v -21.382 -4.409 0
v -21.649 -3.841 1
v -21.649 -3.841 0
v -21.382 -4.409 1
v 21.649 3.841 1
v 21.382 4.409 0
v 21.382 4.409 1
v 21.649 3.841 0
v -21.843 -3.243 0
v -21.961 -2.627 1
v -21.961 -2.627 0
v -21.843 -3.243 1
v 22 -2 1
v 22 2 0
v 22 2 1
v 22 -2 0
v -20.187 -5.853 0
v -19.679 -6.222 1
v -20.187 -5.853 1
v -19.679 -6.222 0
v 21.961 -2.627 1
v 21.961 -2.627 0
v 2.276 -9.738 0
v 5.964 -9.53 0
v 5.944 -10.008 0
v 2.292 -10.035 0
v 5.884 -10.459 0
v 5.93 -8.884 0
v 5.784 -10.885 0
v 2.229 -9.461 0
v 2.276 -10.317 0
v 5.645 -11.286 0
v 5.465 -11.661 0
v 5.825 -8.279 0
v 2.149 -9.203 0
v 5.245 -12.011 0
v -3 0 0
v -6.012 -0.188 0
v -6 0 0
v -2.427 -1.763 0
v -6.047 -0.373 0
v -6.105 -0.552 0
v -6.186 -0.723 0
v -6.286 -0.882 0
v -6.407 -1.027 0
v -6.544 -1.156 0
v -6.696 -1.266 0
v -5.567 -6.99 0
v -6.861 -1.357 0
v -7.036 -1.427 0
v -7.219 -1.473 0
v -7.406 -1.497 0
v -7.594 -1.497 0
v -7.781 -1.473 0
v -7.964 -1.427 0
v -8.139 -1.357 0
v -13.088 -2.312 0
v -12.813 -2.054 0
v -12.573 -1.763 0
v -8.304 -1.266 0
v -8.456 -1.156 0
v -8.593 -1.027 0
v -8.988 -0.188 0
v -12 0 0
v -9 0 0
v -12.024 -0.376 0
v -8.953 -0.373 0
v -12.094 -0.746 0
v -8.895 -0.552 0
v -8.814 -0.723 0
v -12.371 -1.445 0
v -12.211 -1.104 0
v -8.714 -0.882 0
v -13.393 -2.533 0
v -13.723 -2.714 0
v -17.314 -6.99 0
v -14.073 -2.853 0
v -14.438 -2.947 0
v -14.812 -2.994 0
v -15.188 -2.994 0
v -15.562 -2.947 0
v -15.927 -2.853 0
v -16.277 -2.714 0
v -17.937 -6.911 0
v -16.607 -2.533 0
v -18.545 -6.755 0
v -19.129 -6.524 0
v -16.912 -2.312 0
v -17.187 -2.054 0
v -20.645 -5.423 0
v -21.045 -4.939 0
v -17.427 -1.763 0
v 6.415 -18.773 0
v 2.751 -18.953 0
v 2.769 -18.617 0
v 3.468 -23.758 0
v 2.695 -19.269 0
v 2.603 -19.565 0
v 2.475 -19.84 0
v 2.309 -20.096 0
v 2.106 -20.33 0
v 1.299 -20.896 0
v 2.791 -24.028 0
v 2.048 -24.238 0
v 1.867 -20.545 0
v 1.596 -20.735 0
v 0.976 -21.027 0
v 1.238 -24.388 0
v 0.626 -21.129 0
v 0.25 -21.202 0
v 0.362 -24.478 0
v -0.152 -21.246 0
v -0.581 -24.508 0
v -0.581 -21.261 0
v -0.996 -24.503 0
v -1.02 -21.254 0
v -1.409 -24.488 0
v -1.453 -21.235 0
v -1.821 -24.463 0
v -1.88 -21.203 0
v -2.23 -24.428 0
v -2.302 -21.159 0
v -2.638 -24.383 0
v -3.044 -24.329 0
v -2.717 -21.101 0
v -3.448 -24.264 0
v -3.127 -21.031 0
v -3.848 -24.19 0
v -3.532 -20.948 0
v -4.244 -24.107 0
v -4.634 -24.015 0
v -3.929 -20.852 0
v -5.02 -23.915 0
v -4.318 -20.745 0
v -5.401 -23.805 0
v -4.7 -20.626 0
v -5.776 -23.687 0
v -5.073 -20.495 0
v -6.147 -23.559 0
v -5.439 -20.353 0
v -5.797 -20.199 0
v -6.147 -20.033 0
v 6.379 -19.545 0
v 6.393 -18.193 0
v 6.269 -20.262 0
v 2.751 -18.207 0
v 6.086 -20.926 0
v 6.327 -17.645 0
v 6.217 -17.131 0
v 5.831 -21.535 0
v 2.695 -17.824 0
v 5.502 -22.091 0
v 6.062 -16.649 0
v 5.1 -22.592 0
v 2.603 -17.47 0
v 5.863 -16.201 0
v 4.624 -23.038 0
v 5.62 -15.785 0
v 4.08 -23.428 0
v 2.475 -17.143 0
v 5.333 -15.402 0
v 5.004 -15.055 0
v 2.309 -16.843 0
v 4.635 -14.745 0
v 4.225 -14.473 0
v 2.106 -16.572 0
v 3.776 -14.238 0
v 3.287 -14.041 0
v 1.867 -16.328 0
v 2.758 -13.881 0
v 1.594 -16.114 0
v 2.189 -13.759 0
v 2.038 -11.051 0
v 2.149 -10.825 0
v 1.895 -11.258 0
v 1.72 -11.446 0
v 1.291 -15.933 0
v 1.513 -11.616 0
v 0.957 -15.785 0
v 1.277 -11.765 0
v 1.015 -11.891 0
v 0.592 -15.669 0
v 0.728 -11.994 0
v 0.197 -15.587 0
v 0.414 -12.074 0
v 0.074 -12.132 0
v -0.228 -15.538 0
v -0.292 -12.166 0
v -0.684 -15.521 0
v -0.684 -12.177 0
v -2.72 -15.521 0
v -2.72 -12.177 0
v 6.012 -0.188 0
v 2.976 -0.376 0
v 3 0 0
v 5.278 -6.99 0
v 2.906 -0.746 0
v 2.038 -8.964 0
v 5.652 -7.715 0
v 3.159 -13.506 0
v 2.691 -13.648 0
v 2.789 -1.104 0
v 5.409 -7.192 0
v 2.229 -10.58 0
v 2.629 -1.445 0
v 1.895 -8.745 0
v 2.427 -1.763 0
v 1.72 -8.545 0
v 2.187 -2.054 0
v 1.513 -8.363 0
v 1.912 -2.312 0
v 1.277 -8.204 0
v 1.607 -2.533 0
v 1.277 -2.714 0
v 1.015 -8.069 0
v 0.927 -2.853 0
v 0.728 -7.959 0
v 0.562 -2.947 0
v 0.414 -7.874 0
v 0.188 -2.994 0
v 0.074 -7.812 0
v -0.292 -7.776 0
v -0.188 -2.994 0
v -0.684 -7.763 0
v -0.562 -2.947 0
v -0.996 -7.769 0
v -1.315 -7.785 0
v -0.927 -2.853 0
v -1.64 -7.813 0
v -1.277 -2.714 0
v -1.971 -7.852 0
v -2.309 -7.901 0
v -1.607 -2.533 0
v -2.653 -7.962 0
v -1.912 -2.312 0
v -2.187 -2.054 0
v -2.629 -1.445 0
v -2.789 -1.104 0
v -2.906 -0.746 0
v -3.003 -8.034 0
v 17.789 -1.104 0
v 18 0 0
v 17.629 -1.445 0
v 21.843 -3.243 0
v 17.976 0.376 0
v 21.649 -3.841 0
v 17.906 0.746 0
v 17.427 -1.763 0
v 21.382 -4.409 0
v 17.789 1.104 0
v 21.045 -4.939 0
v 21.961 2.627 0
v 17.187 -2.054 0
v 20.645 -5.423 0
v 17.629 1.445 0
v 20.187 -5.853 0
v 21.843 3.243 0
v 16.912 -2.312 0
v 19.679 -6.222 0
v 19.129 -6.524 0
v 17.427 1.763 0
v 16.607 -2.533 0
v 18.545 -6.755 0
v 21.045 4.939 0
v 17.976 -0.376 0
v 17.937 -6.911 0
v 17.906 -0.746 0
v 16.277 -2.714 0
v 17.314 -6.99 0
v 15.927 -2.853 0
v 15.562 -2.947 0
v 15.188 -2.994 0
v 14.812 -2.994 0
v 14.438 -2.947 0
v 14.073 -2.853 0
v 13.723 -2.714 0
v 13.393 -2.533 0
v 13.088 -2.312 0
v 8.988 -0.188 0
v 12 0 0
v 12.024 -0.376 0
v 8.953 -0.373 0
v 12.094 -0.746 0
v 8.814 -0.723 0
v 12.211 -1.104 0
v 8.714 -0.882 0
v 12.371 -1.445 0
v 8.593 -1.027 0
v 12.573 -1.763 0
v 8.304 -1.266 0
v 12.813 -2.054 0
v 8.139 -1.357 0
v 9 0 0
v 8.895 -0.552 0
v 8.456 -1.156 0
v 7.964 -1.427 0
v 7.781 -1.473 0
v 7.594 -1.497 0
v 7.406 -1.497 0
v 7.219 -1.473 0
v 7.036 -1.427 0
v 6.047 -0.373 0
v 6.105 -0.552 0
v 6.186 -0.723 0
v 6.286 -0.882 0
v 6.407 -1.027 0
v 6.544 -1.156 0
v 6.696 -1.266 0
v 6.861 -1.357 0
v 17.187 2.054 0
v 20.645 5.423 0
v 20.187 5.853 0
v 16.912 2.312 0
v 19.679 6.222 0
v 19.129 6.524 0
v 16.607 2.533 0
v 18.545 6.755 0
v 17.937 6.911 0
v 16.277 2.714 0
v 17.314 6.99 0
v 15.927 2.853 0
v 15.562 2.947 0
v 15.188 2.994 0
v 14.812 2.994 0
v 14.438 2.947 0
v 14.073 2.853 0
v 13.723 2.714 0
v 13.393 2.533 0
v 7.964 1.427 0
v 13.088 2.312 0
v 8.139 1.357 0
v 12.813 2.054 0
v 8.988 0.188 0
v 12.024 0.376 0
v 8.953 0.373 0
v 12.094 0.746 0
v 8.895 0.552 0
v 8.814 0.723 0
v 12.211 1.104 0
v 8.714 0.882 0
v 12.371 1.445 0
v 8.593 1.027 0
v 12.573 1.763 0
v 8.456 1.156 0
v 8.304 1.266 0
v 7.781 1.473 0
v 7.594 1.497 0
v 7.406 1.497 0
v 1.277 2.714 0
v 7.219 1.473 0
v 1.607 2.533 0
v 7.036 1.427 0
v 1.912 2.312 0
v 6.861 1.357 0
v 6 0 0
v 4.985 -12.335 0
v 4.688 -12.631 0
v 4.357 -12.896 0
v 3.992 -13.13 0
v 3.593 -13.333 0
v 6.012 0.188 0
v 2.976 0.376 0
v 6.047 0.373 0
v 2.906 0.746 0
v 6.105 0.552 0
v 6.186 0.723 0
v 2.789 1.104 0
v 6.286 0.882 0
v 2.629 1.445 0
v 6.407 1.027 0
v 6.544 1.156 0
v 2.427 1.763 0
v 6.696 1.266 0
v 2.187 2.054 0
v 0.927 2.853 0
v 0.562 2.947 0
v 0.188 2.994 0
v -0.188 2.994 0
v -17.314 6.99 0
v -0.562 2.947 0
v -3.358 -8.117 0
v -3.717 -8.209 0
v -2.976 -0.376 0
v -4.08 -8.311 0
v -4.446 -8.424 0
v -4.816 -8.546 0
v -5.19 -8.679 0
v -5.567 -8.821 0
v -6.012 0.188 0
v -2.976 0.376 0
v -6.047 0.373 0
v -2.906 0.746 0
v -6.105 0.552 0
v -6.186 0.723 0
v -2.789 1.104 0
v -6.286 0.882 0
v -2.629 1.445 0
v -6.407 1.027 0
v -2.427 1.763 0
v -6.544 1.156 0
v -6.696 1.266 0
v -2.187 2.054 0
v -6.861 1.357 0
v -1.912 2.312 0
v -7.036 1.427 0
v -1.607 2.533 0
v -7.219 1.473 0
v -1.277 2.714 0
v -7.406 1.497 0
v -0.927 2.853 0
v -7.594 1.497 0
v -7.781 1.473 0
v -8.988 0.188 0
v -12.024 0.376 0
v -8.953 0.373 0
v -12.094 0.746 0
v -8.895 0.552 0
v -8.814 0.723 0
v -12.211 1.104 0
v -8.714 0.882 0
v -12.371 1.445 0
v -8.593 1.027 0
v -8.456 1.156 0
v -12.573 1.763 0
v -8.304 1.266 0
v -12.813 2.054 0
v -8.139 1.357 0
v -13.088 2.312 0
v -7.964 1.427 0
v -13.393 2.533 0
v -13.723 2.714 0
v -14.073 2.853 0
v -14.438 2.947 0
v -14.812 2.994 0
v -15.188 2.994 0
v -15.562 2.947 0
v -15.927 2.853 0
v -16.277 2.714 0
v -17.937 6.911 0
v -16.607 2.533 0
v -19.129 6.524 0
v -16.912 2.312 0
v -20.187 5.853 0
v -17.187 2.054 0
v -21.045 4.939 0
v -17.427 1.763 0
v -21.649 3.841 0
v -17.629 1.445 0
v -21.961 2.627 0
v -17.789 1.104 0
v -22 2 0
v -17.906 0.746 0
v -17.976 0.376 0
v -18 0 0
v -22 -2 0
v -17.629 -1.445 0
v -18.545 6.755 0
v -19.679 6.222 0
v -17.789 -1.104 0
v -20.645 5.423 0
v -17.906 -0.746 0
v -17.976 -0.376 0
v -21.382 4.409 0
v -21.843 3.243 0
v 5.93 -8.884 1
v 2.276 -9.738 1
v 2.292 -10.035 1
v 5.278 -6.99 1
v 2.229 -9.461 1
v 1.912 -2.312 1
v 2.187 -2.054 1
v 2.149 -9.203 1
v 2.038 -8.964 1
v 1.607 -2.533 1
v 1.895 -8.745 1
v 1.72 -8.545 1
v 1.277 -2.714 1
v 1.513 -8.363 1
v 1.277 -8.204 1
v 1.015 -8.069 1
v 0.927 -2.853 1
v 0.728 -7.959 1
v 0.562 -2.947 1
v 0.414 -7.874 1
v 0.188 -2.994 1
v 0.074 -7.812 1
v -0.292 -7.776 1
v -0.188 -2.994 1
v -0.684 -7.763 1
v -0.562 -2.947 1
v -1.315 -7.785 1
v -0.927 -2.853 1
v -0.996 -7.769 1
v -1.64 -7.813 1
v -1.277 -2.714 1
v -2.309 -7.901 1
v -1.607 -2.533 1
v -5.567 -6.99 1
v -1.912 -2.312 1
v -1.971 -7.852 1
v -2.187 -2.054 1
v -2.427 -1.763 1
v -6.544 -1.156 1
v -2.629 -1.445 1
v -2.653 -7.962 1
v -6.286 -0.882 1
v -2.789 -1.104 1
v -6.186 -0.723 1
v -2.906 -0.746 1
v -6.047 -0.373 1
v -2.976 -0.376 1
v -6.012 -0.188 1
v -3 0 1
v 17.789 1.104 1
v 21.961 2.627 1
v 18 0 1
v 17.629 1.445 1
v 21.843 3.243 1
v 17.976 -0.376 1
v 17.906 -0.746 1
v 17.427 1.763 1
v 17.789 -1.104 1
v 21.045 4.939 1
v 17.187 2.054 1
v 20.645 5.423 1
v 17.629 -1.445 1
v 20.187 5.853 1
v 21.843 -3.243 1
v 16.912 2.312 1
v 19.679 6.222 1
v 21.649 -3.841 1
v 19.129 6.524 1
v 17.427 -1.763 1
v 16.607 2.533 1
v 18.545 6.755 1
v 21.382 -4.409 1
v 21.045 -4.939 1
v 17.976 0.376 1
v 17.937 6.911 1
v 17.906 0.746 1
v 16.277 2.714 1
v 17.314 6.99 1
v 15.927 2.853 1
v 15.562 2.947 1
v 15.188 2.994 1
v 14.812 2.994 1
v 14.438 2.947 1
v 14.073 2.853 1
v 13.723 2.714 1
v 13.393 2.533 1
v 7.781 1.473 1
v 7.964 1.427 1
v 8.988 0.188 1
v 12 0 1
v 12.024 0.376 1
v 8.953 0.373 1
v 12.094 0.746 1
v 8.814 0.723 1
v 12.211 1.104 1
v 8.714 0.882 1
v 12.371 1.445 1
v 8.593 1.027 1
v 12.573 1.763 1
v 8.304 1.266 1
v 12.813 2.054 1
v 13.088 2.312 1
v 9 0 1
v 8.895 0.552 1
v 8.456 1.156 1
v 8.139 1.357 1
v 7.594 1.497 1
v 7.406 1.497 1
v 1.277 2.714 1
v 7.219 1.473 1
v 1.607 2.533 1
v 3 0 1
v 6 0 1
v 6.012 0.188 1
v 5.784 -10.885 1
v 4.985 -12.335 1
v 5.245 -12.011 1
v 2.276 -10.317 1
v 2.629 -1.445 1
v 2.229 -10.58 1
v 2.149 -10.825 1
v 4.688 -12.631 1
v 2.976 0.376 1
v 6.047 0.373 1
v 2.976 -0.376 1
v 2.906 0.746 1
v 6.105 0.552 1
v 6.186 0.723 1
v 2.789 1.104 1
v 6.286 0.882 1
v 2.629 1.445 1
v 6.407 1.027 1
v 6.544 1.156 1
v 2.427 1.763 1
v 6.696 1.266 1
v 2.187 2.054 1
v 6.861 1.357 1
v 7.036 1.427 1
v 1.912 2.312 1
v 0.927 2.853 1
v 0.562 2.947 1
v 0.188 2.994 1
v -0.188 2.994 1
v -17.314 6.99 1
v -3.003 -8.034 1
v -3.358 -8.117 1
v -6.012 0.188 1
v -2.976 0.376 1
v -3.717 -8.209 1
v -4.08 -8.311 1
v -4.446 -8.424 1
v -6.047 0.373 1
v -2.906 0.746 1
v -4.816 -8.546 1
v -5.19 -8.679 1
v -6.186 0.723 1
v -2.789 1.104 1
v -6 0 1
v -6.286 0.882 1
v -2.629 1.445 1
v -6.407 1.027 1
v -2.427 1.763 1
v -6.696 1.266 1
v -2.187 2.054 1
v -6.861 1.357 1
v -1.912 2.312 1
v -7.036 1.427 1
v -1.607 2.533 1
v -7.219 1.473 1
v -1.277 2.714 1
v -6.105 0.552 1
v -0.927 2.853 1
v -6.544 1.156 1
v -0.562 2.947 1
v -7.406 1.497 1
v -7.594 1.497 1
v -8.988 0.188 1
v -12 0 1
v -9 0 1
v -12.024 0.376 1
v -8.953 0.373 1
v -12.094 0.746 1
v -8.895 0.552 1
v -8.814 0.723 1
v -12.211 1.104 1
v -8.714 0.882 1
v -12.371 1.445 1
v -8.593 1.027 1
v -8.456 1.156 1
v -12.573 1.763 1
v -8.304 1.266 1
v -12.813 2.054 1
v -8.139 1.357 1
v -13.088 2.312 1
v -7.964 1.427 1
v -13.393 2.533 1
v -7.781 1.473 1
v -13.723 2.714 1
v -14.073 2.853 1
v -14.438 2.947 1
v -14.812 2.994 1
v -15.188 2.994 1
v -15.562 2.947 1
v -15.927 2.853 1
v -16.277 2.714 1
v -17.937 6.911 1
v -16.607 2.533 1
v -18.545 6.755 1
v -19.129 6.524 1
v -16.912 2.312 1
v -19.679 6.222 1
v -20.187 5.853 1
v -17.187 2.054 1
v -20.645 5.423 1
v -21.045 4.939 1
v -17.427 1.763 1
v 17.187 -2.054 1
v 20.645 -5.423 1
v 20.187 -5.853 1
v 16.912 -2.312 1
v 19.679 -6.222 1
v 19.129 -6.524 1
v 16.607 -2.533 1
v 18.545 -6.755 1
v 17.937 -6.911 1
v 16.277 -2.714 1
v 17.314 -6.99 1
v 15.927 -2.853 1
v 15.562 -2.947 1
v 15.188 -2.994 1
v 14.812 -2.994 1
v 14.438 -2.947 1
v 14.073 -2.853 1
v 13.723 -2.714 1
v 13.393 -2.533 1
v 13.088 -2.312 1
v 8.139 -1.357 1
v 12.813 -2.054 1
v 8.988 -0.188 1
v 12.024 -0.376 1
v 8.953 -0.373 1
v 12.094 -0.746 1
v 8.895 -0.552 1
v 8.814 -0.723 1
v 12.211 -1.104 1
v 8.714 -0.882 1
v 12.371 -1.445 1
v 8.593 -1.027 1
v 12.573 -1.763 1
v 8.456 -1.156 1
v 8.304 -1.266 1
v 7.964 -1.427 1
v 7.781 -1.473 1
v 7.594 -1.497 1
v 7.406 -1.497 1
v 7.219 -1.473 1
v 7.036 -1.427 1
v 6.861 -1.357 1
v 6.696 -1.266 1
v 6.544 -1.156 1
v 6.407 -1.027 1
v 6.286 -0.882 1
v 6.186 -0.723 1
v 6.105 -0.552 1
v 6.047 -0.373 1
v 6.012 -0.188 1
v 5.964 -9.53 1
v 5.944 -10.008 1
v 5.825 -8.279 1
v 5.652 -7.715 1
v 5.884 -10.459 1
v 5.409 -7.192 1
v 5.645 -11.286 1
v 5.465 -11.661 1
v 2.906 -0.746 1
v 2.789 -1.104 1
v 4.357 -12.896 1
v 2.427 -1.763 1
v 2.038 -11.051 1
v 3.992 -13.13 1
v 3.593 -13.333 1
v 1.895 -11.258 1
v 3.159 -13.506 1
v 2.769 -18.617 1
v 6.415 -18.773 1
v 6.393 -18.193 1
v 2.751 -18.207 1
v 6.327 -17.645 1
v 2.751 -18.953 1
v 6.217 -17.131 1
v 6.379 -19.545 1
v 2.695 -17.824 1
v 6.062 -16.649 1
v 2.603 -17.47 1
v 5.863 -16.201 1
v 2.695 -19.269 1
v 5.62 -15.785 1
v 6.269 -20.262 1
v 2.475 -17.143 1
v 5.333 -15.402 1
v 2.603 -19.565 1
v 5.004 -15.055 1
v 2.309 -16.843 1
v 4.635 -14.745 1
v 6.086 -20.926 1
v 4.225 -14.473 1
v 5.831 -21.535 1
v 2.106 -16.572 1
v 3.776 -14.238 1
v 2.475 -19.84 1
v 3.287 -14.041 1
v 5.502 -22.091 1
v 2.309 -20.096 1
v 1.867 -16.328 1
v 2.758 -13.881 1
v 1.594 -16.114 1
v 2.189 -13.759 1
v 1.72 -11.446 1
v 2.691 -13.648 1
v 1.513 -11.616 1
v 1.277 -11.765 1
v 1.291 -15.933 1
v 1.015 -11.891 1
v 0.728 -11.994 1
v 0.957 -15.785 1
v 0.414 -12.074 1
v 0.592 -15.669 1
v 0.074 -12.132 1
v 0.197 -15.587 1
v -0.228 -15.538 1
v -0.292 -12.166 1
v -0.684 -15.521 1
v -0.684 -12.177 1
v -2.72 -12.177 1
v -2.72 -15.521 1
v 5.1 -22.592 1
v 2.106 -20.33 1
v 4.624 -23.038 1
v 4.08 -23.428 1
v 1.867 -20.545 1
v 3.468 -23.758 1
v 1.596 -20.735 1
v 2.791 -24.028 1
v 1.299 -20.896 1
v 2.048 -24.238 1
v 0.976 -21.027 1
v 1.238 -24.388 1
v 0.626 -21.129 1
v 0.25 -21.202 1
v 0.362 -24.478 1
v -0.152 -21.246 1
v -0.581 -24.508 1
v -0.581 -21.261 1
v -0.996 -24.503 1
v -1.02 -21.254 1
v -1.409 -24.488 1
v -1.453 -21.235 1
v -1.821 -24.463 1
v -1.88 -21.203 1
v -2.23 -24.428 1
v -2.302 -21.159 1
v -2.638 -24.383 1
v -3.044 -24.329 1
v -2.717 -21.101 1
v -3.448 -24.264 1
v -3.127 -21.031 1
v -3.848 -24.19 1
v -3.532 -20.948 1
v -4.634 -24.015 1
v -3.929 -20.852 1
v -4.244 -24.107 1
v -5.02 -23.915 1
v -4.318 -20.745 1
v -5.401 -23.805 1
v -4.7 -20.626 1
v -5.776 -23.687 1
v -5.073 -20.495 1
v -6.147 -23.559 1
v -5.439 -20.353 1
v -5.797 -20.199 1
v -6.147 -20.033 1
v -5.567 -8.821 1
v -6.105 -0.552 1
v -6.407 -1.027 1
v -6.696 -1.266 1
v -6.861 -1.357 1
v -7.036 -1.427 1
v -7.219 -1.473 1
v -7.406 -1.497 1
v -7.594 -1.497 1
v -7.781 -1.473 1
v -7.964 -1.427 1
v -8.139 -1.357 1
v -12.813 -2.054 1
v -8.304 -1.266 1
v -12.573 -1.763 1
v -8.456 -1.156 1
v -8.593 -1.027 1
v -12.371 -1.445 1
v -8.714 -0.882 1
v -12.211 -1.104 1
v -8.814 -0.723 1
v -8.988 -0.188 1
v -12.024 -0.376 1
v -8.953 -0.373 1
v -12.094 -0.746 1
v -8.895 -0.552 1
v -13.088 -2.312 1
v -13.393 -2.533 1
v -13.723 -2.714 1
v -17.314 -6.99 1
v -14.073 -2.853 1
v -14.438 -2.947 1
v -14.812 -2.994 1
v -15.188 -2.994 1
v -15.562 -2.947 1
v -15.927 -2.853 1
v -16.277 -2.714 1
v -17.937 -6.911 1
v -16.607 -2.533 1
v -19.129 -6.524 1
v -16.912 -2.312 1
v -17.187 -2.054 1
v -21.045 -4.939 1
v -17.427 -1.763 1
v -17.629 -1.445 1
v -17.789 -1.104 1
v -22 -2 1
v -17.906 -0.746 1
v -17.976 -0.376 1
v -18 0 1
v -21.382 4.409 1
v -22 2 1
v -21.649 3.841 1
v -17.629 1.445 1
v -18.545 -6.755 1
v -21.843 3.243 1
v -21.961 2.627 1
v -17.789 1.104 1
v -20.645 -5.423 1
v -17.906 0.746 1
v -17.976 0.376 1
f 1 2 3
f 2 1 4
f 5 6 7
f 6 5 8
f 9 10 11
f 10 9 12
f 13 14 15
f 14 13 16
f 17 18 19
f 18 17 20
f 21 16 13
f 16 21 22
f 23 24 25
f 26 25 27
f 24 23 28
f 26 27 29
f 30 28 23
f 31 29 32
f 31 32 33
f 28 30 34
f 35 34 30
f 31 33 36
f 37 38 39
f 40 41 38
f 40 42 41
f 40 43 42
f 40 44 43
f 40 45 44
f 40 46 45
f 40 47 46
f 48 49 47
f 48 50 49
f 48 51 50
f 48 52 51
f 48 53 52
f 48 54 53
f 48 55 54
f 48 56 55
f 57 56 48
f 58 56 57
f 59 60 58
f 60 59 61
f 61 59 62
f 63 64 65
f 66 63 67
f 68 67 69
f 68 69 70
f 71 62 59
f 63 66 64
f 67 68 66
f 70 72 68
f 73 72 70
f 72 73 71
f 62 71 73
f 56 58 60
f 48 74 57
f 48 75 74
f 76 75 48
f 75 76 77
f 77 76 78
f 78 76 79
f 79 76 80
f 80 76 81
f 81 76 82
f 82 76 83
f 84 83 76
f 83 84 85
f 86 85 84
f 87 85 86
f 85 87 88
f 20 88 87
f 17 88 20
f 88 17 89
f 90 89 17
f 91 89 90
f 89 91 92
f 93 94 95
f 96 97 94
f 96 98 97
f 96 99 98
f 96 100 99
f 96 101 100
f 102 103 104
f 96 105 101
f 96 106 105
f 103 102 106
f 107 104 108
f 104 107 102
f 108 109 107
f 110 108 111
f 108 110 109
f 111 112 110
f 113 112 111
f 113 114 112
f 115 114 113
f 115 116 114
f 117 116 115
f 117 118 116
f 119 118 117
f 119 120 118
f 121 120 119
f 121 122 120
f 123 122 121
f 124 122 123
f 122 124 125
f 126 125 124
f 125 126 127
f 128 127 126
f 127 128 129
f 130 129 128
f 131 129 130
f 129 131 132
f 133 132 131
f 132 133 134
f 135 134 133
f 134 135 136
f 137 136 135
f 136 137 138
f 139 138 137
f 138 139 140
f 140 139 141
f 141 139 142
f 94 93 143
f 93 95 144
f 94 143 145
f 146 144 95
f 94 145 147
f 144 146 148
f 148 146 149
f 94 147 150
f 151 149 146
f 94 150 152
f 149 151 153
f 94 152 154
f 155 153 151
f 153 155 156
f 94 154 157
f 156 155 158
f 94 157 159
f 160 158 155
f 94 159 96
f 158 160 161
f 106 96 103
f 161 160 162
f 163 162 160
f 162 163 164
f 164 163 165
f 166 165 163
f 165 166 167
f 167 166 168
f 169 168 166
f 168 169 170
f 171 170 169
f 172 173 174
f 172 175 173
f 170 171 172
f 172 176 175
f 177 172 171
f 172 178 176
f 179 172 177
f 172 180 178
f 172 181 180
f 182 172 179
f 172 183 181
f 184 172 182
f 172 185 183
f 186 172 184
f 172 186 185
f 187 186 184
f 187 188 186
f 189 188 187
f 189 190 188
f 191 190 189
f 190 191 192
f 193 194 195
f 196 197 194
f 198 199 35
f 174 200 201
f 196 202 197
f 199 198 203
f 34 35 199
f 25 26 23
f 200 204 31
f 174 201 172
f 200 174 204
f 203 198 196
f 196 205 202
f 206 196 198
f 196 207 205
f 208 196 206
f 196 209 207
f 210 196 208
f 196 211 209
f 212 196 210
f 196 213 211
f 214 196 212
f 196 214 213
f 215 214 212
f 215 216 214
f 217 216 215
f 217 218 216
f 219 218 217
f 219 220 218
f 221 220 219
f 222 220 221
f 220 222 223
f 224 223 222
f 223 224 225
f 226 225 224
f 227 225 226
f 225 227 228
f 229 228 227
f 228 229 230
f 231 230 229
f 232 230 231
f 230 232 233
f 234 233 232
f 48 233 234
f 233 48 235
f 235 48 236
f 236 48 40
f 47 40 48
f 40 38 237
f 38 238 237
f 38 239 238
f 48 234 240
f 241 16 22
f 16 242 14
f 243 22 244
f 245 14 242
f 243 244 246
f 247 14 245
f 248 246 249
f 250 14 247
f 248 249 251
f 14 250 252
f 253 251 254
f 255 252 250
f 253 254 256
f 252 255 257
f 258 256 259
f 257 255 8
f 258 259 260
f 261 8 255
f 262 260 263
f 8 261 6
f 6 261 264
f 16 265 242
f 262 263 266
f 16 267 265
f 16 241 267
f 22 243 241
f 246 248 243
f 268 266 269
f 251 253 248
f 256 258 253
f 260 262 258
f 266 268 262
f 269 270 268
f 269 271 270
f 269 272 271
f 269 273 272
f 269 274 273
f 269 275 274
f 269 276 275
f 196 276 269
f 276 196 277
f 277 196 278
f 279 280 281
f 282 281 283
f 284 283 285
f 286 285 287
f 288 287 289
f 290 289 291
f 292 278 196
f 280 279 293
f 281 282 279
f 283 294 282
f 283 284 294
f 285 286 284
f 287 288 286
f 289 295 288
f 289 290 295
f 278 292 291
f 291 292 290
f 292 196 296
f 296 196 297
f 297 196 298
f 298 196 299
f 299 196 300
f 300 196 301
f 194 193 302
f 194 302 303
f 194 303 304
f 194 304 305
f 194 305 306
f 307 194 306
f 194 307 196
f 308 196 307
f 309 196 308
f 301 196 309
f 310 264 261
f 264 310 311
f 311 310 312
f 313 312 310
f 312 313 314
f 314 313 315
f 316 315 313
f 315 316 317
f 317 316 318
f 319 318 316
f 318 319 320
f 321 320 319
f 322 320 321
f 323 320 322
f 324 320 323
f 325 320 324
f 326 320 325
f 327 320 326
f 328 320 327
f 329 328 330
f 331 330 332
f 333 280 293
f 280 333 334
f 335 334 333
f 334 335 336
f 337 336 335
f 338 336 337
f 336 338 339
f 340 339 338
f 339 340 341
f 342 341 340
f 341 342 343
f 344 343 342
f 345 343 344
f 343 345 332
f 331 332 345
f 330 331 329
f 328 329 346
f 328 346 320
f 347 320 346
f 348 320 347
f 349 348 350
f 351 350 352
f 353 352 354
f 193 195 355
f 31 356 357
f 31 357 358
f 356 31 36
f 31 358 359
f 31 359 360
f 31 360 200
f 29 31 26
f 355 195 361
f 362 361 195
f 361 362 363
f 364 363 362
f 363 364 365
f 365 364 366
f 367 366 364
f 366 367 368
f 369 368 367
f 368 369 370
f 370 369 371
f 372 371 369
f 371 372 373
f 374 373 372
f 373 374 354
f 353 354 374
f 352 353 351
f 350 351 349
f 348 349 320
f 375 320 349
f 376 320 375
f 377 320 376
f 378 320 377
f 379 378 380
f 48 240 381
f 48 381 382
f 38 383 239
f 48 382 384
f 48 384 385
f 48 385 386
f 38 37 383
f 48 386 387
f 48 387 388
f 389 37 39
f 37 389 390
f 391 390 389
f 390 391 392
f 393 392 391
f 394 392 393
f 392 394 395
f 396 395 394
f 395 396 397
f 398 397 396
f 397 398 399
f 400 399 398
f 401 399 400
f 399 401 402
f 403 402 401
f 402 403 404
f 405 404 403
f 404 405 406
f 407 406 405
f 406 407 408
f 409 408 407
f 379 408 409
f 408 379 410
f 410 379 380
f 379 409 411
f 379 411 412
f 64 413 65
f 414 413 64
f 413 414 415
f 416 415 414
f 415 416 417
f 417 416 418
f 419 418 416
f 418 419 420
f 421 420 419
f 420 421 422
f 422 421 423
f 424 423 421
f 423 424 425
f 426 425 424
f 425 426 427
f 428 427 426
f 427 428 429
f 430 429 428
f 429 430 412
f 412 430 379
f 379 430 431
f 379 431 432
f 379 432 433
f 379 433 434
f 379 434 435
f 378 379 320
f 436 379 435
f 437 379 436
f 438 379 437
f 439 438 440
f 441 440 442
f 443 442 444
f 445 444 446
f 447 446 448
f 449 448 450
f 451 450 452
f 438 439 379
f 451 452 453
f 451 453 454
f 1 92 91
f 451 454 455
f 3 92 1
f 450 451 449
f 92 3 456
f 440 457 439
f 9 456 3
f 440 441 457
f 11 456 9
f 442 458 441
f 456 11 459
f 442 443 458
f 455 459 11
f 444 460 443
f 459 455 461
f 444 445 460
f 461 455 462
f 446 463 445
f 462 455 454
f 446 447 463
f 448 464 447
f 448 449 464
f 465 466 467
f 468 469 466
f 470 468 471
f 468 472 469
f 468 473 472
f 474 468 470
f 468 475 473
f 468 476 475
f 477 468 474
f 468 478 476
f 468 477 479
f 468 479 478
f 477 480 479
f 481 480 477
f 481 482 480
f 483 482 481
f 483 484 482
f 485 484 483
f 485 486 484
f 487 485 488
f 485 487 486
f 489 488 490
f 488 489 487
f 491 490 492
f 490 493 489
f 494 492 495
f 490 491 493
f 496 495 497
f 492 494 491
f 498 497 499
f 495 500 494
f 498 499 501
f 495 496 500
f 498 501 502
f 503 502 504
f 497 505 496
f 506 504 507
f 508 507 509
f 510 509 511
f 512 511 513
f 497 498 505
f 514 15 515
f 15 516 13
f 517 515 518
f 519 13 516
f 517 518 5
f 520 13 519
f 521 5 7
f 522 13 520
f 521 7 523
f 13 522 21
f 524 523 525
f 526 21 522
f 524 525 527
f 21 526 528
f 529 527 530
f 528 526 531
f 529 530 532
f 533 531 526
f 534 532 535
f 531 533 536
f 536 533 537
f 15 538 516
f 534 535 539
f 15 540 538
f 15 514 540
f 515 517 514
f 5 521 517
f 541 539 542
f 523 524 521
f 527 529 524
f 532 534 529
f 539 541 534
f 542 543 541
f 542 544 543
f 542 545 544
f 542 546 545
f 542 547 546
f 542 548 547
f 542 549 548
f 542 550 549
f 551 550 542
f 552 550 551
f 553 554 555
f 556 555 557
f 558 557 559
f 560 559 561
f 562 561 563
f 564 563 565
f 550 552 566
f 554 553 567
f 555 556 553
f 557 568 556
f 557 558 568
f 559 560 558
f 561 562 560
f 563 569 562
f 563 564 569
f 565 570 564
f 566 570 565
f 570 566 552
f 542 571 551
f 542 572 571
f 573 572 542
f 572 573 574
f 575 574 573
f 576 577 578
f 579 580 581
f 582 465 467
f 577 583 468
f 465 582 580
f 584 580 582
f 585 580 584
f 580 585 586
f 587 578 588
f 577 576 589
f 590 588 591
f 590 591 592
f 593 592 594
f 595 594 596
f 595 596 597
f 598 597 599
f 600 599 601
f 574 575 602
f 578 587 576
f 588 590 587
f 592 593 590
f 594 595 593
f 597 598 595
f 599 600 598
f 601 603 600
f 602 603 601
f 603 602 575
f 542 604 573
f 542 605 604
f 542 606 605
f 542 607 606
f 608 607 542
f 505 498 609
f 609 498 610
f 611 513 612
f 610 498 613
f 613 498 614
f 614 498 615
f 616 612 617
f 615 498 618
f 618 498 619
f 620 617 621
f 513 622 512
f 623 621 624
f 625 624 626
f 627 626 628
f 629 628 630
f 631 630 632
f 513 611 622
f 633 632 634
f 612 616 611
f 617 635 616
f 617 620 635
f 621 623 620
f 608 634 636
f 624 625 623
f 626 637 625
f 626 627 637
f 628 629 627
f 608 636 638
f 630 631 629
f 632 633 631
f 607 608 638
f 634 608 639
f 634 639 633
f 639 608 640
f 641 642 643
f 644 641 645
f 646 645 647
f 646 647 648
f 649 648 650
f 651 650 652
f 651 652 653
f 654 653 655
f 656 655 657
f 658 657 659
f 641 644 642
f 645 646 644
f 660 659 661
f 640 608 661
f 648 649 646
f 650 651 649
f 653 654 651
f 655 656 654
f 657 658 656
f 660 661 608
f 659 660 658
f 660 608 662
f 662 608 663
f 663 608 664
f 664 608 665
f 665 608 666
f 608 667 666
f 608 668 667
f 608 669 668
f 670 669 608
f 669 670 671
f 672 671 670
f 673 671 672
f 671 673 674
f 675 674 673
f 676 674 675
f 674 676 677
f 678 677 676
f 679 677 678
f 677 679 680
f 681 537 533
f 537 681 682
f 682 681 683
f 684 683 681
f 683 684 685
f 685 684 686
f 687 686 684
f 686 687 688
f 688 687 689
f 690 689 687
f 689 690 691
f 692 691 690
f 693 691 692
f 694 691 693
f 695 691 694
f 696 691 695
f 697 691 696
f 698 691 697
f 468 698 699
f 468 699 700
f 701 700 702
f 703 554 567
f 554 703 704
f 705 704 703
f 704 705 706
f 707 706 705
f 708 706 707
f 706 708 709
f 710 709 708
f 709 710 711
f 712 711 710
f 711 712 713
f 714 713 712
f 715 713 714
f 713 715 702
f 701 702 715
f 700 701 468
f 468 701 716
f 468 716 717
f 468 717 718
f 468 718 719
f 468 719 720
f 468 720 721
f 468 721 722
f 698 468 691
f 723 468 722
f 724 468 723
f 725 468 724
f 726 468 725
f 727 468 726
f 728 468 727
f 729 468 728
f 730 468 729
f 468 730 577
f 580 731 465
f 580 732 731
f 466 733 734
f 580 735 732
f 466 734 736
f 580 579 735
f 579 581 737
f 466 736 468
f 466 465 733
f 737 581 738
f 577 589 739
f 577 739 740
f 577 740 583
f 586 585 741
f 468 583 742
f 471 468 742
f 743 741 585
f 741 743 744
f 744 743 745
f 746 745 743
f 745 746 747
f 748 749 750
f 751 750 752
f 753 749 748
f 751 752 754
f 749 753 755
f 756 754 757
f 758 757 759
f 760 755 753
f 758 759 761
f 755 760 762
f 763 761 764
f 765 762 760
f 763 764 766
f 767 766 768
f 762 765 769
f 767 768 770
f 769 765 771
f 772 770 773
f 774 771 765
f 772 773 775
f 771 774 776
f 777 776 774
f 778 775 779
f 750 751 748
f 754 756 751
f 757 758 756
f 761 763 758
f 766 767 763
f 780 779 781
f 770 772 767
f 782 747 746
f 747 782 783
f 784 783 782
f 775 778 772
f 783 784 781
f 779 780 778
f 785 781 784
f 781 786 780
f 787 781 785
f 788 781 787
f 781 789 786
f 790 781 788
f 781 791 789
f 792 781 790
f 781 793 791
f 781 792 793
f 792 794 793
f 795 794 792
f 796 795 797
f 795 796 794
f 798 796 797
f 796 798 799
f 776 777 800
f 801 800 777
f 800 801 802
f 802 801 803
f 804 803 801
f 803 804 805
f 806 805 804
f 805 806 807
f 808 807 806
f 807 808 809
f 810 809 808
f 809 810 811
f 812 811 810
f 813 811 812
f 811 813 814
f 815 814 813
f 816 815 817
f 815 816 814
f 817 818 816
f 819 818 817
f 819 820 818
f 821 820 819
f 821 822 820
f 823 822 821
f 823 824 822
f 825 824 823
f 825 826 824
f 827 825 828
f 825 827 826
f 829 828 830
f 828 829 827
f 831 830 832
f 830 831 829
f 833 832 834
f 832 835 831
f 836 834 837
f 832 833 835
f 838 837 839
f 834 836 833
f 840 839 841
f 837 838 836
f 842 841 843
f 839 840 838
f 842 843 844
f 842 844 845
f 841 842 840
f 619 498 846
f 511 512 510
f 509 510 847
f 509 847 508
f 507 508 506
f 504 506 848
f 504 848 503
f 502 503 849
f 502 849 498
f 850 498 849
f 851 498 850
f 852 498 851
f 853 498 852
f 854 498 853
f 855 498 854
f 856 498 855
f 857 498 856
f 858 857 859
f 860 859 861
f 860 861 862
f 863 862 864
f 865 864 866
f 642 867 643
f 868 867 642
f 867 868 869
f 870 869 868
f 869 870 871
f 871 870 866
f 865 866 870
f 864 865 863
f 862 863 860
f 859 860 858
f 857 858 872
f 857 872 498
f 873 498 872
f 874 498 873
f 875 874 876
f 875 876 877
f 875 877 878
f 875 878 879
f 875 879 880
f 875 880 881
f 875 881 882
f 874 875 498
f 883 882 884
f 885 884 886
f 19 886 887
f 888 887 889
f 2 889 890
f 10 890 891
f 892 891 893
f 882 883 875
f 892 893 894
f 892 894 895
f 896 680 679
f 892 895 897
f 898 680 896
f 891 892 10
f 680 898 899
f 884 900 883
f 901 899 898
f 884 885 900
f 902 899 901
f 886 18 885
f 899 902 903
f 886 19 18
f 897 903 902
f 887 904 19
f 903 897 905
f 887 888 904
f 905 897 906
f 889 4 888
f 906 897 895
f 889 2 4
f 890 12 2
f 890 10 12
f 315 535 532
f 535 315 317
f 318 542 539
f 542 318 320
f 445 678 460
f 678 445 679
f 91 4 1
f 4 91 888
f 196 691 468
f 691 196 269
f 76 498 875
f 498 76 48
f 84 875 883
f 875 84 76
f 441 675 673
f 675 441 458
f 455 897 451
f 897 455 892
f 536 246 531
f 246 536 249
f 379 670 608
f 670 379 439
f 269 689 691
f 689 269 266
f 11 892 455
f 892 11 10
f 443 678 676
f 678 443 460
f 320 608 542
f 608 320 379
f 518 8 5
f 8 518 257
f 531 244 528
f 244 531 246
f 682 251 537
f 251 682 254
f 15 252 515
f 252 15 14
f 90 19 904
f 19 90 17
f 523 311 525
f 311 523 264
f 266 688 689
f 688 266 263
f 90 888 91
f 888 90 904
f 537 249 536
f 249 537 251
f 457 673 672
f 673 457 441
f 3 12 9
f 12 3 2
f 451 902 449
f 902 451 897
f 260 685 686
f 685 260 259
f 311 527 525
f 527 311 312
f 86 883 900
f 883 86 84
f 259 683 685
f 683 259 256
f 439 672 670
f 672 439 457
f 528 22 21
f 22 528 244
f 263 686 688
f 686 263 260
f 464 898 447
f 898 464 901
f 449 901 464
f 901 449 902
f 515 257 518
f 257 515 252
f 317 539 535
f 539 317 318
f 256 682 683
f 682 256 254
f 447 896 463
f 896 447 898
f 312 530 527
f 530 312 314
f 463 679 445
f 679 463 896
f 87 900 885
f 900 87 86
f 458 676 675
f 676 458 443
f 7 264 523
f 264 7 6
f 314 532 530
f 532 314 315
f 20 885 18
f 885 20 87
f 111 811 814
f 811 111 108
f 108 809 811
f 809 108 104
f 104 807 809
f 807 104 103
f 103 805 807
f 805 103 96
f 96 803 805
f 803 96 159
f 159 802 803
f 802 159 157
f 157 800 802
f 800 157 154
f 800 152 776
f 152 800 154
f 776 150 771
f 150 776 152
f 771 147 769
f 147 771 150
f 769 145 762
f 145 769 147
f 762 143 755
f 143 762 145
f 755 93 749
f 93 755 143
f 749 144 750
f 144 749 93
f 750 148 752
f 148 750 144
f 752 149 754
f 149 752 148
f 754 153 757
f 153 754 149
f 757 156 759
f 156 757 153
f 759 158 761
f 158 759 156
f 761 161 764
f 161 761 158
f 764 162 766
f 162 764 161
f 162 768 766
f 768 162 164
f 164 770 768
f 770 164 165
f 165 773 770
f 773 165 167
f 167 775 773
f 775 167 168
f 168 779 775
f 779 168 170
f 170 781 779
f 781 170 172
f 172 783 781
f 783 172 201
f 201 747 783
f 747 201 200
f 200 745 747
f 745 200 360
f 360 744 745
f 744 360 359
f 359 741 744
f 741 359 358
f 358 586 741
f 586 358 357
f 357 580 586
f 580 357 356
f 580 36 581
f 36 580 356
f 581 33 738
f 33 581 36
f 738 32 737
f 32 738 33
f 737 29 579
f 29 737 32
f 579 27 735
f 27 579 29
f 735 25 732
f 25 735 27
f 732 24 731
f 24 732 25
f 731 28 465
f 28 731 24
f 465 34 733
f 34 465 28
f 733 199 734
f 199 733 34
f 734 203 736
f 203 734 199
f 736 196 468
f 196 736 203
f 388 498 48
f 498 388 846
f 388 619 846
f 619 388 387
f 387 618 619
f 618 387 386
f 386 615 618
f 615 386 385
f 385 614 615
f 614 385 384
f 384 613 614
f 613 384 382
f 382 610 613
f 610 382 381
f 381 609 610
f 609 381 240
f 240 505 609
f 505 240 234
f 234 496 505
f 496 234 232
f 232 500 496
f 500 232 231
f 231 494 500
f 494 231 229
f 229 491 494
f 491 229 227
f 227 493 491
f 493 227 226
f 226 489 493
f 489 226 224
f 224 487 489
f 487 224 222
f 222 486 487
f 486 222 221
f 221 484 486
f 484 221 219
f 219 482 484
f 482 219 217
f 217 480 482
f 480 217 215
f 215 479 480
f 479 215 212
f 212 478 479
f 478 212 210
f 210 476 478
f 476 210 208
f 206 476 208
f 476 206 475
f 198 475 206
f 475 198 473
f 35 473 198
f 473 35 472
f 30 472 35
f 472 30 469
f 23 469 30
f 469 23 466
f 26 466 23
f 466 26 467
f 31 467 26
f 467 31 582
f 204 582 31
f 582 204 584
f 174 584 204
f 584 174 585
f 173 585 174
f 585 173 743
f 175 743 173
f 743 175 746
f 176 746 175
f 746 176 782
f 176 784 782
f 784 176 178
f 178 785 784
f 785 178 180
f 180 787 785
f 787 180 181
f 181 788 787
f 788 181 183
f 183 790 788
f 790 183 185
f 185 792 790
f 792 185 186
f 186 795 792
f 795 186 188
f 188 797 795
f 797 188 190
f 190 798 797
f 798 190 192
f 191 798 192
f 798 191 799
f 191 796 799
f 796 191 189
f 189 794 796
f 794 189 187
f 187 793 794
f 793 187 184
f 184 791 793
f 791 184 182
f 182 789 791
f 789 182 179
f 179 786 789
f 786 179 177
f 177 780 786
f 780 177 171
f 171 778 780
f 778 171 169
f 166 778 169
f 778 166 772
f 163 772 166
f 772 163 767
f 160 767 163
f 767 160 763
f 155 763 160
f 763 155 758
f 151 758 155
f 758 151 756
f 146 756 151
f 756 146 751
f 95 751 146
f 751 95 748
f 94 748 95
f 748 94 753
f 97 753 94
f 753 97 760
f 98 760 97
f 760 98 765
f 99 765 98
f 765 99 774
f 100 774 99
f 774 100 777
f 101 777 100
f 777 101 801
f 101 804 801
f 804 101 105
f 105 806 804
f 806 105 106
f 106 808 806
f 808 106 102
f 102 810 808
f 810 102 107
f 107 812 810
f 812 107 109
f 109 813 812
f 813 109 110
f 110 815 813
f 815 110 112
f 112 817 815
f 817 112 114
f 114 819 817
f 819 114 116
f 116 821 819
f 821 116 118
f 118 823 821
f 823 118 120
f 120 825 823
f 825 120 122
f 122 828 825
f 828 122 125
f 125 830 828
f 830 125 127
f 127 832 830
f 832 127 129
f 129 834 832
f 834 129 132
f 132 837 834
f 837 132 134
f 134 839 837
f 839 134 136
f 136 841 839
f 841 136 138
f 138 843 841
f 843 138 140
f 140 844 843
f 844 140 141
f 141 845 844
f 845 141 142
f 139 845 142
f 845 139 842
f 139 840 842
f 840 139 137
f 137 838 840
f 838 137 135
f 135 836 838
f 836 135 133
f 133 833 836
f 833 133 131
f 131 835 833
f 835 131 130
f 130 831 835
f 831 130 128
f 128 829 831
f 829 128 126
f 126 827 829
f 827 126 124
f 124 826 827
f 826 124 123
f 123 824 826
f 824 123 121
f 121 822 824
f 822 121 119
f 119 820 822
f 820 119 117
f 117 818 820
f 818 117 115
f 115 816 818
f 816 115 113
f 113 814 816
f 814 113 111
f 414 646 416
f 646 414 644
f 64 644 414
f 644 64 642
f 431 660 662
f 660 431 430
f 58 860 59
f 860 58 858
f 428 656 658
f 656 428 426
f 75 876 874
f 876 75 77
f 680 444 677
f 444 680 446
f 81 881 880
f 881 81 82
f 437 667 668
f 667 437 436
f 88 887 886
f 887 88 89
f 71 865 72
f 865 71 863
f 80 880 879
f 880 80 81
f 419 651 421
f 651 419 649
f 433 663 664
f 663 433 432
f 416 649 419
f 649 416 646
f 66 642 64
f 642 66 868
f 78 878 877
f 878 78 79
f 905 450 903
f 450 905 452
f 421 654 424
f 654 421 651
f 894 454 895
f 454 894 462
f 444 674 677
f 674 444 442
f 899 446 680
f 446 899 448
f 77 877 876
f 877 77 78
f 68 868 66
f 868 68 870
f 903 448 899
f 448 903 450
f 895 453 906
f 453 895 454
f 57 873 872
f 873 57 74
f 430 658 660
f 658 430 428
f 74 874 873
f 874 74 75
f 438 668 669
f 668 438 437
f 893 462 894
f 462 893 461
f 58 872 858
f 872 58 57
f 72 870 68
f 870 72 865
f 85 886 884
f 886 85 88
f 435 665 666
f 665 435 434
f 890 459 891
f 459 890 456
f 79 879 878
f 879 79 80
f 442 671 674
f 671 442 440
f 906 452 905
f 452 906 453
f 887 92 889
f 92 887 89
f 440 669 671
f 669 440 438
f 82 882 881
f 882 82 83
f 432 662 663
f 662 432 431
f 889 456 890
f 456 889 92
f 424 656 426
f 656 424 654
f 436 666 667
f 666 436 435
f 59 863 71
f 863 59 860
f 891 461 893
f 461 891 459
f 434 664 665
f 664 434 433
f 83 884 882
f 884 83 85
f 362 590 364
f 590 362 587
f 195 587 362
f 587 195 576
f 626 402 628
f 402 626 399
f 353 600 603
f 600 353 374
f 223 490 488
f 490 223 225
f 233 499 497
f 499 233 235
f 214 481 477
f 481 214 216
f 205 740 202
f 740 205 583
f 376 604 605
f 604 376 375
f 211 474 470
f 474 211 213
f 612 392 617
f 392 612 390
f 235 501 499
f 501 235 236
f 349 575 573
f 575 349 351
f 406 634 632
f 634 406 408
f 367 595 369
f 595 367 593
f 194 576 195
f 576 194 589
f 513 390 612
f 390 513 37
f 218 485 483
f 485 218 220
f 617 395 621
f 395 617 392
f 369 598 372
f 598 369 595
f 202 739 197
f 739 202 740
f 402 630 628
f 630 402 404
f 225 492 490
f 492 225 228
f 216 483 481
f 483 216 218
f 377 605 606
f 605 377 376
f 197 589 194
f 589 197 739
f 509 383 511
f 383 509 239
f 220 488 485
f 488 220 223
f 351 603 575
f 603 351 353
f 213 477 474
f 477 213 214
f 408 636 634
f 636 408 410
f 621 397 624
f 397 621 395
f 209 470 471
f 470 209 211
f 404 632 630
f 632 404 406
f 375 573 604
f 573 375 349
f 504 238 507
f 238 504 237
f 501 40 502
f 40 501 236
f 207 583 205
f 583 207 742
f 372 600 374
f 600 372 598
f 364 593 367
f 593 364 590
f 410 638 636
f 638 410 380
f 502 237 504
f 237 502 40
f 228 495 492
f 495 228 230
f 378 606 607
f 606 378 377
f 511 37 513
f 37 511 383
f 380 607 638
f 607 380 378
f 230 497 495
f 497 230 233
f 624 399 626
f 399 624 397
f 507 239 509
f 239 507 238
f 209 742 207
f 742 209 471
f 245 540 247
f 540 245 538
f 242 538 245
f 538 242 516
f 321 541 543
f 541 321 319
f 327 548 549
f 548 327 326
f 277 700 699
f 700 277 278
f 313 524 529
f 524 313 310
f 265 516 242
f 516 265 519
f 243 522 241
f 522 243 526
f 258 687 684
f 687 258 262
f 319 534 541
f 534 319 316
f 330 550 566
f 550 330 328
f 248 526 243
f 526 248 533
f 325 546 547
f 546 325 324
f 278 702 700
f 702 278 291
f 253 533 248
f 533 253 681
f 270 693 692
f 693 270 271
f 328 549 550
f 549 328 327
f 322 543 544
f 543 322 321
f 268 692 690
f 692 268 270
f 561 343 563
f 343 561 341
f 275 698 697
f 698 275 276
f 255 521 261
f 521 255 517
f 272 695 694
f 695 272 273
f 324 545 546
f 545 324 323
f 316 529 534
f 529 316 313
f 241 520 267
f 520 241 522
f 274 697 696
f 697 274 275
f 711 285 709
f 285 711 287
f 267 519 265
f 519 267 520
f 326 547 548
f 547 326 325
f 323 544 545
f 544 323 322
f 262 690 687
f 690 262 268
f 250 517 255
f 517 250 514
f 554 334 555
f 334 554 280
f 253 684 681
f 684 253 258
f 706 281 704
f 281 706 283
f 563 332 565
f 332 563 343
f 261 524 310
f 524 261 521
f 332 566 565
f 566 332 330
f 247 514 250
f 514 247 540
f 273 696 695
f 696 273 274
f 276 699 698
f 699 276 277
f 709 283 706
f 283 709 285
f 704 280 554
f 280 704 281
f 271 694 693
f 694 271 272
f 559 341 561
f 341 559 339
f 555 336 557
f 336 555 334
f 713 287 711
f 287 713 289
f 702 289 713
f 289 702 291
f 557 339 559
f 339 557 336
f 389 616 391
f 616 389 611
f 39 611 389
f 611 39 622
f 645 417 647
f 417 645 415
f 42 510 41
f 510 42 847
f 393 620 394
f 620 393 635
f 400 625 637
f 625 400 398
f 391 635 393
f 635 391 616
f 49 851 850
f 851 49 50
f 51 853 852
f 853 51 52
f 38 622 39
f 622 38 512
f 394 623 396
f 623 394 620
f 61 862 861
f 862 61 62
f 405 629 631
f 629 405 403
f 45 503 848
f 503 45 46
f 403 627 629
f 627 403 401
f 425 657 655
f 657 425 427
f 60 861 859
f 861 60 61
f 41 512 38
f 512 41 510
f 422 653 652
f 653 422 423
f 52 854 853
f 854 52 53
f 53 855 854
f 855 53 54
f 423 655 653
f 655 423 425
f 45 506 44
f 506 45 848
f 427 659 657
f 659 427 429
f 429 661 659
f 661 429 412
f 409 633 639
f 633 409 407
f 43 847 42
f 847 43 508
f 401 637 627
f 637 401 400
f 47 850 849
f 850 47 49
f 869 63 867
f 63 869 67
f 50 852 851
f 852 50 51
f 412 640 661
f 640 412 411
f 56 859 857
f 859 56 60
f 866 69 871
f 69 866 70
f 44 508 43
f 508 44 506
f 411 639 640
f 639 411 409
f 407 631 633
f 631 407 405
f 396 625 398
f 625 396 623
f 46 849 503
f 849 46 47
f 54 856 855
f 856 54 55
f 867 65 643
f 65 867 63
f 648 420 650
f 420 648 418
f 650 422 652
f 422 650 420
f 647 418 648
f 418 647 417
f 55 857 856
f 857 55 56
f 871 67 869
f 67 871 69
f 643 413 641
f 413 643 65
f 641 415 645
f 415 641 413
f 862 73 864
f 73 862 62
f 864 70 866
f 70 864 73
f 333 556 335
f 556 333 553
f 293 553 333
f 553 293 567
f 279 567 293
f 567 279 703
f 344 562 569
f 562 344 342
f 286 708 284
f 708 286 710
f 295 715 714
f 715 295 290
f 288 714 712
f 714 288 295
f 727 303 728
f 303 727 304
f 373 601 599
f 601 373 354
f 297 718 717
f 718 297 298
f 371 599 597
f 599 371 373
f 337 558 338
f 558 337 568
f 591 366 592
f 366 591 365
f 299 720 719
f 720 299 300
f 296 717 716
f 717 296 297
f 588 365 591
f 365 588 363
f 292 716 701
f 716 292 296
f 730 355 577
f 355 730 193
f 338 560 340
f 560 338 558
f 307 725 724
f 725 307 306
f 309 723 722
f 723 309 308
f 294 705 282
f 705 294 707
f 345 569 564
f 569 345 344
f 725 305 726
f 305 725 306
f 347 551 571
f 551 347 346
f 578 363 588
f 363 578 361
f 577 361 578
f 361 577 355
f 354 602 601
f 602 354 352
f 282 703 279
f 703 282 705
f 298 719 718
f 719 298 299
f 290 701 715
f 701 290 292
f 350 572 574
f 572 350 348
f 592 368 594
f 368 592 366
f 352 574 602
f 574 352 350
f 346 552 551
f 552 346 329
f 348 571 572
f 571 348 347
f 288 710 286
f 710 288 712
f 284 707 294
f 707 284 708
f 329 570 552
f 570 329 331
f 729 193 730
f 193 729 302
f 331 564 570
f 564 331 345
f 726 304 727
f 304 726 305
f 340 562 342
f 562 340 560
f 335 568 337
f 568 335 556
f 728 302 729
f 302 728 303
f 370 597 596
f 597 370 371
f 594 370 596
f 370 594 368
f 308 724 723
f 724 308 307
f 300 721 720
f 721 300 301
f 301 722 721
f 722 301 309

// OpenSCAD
$fn = 50;


difference() {
	union() {
		*color(alpha = 1.0000000000, c = "gray") {
			translate(v = [0, 14, 0]) {
				linear_extrude(height = 1) {
					text(font = "Arial:style=Bold", halign = "center", size = 4.5000000000, text = "COMMENT description oobb_plate_shape_p_type_1_depth_3_width_1_thickness_3_extra_oobb_size", valign = "center");
				}
			}
		}
		hull() {
			translate(v = [-17.0000000000, 2.0000000000, 0]) {
				cylinder(h = 1, r = 5);
			}
			translate(v = [17.0000000000, 2.0000000000, 0]) {
				cylinder(h = 1, r = 5);
			}
			translate(v = [-17.0000000000, -2.0000000000, 0]) {
				cylinder(h = 1, r = 5);
			}
			translate(v = [17.0000000000, -2.0000000000, 0]) {
				cylinder(h = 1, r = 5);
			}
		}
		translate(v = [0, -5, 0]) {
			linear_extrude(height = 1) {
				text(font = "DejaVu Sans Mono:style=Bold", halign = "center", size = 19.0000000000, text = "3", valign = "top");
			}
		}
	}
	union() {
		*color(alpha = 1.0000000000, c = "gray") {
			translate(v = [0, 14, 0]) {
				linear_extrude(height = 1) {
					text(font = "Arial:style=Bold", halign = "center", size = 4.5000000000, text = "COMMENT description oobb_holes_shape_n_type_3_width_1_thickness_3_extra_oobb_size_1_height_'all'_holes_true_both_holes", valign = "center");
				}
			}
		}
		translate(v = [-15.0000000000, 0.0000000000, 0]) {
			translate(v = [0, 0, -50]) {
				cylinder(h = 100, r = 3.0000000000);
			}
		}
		translate(v = [0, 0, -50]) {
			cylinder(h = 100, r = 3.0000000000);
		}
		translate(v = [15.0000000000, 0.0000000000, 0]) {
			translate(v = [0, 0, -50]) {
				cylinder(h = 100, r = 3.0000000000);
			}
		}
		translate(v = [-15.0000000000, 0.0000000000, 0]) {
			translate(v = [0, 0, -50]) {
				cylinder(h = 100, r = 1.5000000000);
			}
		}
		translate(v = [-7.5000000000, 0.0000000000, 0]) {
			translate(v = [0, 0, -50]) {
				cylinder(h = 100, r = 1.5000000000);
			}
		}
		translate(v = [0, 0, -50]) {
			cylinder(h = 100, r = 1.5000000000);
		}
		translate(v = [7.5000000000, 0.0000000000, 0]) {
			translate(v = [0, 0, -50]) {
				cylinder(h = 100, r = 1.5000000000);
			}
		}
		translate(v = [15.0000000000, 0.0000000000, 0]) {
			translate(v = [0, 0, -50]) {
				cylinder(h = 100, r = 1.5000000000);
			}
		}
	}
}
